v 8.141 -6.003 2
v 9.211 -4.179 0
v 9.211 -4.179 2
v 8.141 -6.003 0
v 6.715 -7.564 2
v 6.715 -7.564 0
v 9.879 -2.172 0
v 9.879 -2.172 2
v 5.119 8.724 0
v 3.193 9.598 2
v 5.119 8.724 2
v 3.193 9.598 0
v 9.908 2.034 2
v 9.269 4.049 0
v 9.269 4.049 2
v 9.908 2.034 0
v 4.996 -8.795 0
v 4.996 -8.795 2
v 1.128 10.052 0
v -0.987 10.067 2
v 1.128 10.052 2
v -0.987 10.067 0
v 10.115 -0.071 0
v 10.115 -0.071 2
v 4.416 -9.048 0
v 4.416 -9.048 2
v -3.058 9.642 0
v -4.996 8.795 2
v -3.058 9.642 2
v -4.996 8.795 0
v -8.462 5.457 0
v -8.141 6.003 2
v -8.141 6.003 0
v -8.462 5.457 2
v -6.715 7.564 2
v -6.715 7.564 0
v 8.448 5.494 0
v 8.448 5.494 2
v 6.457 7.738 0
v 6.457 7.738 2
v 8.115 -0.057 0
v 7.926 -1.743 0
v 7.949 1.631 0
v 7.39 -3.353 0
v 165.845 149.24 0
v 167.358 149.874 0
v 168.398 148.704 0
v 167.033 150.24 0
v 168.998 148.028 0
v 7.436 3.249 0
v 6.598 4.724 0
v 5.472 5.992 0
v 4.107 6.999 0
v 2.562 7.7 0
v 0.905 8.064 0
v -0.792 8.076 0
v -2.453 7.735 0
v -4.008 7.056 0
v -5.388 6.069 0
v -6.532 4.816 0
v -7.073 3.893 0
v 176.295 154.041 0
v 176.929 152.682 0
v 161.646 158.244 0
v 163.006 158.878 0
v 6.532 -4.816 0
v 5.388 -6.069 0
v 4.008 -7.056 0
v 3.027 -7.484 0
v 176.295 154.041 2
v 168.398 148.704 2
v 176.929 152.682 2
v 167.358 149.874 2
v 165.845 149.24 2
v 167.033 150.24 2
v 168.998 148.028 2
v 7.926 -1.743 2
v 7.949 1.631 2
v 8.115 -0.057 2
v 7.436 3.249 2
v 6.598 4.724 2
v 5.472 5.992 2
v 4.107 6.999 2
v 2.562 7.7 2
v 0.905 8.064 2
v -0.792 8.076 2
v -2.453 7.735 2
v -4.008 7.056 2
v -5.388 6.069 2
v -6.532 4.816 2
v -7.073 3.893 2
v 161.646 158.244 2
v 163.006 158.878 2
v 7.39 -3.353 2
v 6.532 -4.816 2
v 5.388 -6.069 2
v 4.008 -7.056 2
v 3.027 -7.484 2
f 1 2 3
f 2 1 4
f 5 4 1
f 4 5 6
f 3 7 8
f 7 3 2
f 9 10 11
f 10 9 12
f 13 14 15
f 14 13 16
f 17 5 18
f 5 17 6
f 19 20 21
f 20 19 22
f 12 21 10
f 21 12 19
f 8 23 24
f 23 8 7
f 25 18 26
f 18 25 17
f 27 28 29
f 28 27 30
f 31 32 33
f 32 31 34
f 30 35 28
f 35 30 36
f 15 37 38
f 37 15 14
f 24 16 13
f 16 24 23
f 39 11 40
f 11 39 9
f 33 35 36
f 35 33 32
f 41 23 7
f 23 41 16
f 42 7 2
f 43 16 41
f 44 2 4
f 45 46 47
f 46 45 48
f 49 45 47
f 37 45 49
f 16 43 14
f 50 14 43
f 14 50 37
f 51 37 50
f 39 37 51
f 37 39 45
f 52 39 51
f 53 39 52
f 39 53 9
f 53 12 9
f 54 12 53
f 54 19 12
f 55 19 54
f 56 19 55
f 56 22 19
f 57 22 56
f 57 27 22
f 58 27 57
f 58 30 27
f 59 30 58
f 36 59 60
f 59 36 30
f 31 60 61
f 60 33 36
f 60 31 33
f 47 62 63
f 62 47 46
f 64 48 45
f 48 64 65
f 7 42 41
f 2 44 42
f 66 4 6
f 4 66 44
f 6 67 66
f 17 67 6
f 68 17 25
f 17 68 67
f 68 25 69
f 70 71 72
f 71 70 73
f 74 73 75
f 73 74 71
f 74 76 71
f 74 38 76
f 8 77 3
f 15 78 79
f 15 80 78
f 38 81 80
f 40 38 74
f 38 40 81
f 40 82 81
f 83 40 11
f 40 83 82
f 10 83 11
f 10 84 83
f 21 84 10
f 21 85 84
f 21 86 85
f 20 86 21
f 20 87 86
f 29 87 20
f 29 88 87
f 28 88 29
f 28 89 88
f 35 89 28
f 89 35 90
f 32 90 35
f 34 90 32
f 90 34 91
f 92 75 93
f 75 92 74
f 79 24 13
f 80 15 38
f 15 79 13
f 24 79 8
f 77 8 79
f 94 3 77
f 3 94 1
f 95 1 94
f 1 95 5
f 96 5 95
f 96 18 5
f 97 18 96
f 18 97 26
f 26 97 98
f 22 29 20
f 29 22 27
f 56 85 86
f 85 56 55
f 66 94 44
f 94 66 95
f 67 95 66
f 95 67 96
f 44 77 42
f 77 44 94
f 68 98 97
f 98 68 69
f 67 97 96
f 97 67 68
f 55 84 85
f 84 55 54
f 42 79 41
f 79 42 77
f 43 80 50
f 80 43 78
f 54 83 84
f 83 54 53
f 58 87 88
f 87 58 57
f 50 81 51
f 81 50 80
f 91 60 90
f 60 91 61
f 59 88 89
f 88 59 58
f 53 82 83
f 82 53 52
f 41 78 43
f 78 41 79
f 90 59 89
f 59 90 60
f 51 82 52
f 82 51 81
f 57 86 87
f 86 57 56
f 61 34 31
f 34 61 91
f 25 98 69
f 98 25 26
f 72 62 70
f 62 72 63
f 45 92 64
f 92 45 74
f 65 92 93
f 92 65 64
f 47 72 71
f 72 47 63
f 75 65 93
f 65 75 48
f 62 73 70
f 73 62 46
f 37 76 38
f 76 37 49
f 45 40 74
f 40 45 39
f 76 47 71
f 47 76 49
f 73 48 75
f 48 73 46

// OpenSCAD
use <MCAD/regular_shapes.scad>

r = 16.23/2;
t = 2;

grip_angle = 25;
l = 59 / cos(grip_angle);
w = 3;

cloud_h = 173;
top_angle = atan((sin(grip_angle)*59 + cloud_h) / 59);
top_l = 59/cos(top_angle);


module stick(l=l, grip_angle=grip_angle){
    intersection(){
        cylinder_tube(t, r+t, t);
        translate([0, 50 - r/3, 0])
        cube([100, 100, 100], center=true);
    }

    translate([0, l/2 + r, t/2])
    cube([w, l, t], center=true);

    grip = 10;

    translate([0, l + r - t, 0])
    rotate([0, 0, grip_angle])
    difference(){
        cube([grip+w/2, grip+w/2, t]);
        translate([w/2, w/2, 0])
        cube([grip, grip, t]);
    }
}

//stick();
translate([0, 0, 0])
rotate([0, 0, grip_angle - top_angle])
stick(l=top_l+10, grip_angle=top_angle);
